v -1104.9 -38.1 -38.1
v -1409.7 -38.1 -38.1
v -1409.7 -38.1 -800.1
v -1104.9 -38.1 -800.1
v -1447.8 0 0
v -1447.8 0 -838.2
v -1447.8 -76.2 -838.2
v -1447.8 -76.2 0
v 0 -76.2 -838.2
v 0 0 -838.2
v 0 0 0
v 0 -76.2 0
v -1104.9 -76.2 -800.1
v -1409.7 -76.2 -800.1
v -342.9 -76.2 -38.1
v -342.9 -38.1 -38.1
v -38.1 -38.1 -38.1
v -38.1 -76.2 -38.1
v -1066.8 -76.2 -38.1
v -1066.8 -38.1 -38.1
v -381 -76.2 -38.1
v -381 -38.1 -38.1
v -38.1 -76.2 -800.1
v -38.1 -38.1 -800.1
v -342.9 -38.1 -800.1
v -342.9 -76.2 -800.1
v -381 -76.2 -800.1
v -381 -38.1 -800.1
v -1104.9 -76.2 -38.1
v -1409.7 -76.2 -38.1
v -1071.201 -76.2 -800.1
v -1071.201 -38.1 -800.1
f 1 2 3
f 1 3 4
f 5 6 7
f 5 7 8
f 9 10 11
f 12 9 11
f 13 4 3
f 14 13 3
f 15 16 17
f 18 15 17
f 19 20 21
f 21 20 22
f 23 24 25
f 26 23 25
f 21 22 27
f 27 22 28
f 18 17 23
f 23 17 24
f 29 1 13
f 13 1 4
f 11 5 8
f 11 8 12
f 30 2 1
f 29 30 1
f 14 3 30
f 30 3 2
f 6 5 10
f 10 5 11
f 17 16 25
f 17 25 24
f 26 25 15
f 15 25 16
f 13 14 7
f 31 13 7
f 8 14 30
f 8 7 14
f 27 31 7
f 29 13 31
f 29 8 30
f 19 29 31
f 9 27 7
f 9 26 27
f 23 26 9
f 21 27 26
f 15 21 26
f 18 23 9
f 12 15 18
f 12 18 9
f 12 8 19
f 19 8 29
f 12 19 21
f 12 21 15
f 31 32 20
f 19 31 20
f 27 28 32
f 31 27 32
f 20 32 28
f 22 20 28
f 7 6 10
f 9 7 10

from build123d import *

# Parameters (mm, degrees)
F0_W     = 304.8
F0_H     = 190.5
F0_W_2   = 38.1
F1_DEPTH = 38.1
F2_DEPTH = 38.1
F3_DEPTH = 38.1
F4_DEPTH = 38.1
F0_W_3   = 1447.8
F0_H_2   = 838.2
F5_DEPTH = 76.2
F6_DEPTH = 76.2
F7_DEPTH = 76.2


with BuildPart() as f1:
    # F0 (on Front) → F1 (new body)
    with BuildSketch(Plane.XZ):
        with Locations((-190.5, -133.35)):
            Rectangle(F0_W, F0_H)
        with Locations((-361.95, -133.35)):
            Rectangle(F0_W_2, F0_H)
        Polygon((-381, -228.6), (-381, -38.1), (-1066.8, -38.1), (-1067.900241926, -228.6), align=None)
        Polygon((-1067.900241926, -228.6), (-1066.8, -38.1), (-1104.9, -38.1), (-1104.9, -228.6), align=None)
        with Locations((-1257.3, -133.35)):
            Rectangle(F0_W, F0_H)
    extrude(amount=F1_DEPTH)

    # F0 (on Front) → F2 (join)
    with BuildSketch(Plane.XZ):
        Polygon((-38.1, -427.021741867), (-38.1, -228.6), (-342.9, -228.6), (-342.9, -425.2613547854), align=None)
        Polygon((-342.9, -425.2613547854), (-342.9, -228.6), (-381, -228.6), (-381, -425.0413064002), align=None)
        Polygon((-381, -425.0413064002), (-381, -228.6), (-1067.900241926, -228.6), (-1069.0118481718, -421.0676608311), align=None)
        Polygon((-1069.0118481718, -421.0676608311), (-1067.900241926, -228.6), (-1104.9, -228.6), (-1104.9, -420.8603870816), align=None)
        Polygon((-1104.9, -420.8603870816), (-1104.9, -228.6), (-1409.7, -228.6), (-1409.7, -419.1), align=None)
    extrude(amount=F2_DEPTH)

    # F0 (on Front) → F3 (join)
    with BuildSketch(Plane.XZ):
        Polygon((-38.1, -609.6), (-38.1, -427.021741867), (-342.9, -425.2613547854), (-342.9, -607.8396129184), align=None)
        Polygon((-342.9, -607.8396129184), (-342.9, -425.2613547854), (-381, -425.0413064002), (-381, -607.6195645333), align=None)
        Polygon((-381, -607.6195645333), (-381, -425.0413064002), (-1069.0118481718, -421.0676608311), (-1070.0663025227, -603.6398289122), align=None)
        Polygon((-1070.0663025227, -603.6398289122), (-1069.0118481718, -421.0676608311), (-1104.9, -420.8603870816), (-1104.9, -603.4386452146), align=None)
        Polygon((-1104.9, -603.4386452146), (-1104.9, -420.8603870816), (-1409.7, -419.1), (-1409.7, -601.678258133), align=None)
    extrude(amount=F3_DEPTH)

    # F0 (on Front) → F4 (join)
    with BuildSketch(Plane.XZ):
        Polygon((-38.1, -800.1), (-38.1, -609.6), (-342.9, -607.8396129184), (-342.9, -800.1), align=None)
        Polygon((-342.9, -800.1), (-342.9, -607.8396129184), (-381, -607.6195645333), (-381, -800.1), align=None)
        Polygon((-381, -800.1), (-381, -607.6195645333), (-1070.0663025227, -603.6398289122), (-1071.2009677039, -800.1), align=None)
        Polygon((-1071.2009677039, -800.1), (-1070.0663025227, -603.6398289122), (-1104.9, -603.4386452146), (-1104.9, -800.1), align=None)
        Polygon((-1104.9, -800.1), (-1104.9, -603.4386452146), (-1409.7, -601.678258133), (-1409.7, -800.1), align=None)
    extrude(amount=F4_DEPTH)

    # F0 (on Front) → F5 (join)
    with BuildSketch(Plane.XZ):
        with Locations((-723.9, -419.1)):
            Rectangle(F0_W_3, F0_H_2)
        Polygon((-342.9, -38.1), (-38.1, -38.1), (-38.1, -228.6), (-38.1, -427.021741867), (-38.1, -609.6), (-38.1, -800.1), (-342.9, -800.1), (-381, -800.1), (-1071.2009677039, -800.1), (-1104.9, -800.1), (-1409.7, -800.1), (-1409.7, -601.678258133), (-1409.7, -419.1), (-1409.7, -228.6), (-1409.7, -38.1), (-1104.9, -38.1), (-1066.8, -38.1), (-381, -38.1), align=None, mode=Mode.SUBTRACT)
    extrude(amount=F5_DEPTH)

    # F0 (on Front) → F6 (join)
    with BuildSketch(Plane.XZ):
        Polygon((-1067.900241926, -228.6), (-1066.8, -38.1), (-1104.9, -38.1), (-1104.9, -228.6), align=None)
        Polygon((-1069.0118481718, -421.0676608311), (-1067.900241926, -228.6), (-1104.9, -228.6), (-1104.9, -420.8603870816), align=None)
        Polygon((-1070.0663025227, -603.6398289122), (-1069.0118481718, -421.0676608311), (-1104.9, -420.8603870816), (-1104.9, -603.4386452146), align=None)
        Polygon((-1071.2009677039, -800.1), (-1070.0663025227, -603.6398289122), (-1104.9, -603.4386452146), (-1104.9, -800.1), align=None)
    extrude(amount=F6_DEPTH)

    # F0 (on Front) → F7 (join)
    with BuildSketch(Plane.XZ):
        with Locations((-361.95, -133.35)):
            Rectangle(F0_W_2, F0_H)
        Polygon((-342.9, -425.2613547854), (-342.9, -228.6), (-381, -228.6), (-381, -425.0413064002), align=None)
        Polygon((-342.9, -607.8396129184), (-342.9, -425.2613547854), (-381, -425.0413064002), (-381, -607.6195645333), align=None)
        Polygon((-342.9, -800.1), (-342.9, -607.8396129184), (-381, -607.6195645333), (-381, -800.1), align=None)
    extrude(amount=F7_DEPTH)


solid = f1.part
